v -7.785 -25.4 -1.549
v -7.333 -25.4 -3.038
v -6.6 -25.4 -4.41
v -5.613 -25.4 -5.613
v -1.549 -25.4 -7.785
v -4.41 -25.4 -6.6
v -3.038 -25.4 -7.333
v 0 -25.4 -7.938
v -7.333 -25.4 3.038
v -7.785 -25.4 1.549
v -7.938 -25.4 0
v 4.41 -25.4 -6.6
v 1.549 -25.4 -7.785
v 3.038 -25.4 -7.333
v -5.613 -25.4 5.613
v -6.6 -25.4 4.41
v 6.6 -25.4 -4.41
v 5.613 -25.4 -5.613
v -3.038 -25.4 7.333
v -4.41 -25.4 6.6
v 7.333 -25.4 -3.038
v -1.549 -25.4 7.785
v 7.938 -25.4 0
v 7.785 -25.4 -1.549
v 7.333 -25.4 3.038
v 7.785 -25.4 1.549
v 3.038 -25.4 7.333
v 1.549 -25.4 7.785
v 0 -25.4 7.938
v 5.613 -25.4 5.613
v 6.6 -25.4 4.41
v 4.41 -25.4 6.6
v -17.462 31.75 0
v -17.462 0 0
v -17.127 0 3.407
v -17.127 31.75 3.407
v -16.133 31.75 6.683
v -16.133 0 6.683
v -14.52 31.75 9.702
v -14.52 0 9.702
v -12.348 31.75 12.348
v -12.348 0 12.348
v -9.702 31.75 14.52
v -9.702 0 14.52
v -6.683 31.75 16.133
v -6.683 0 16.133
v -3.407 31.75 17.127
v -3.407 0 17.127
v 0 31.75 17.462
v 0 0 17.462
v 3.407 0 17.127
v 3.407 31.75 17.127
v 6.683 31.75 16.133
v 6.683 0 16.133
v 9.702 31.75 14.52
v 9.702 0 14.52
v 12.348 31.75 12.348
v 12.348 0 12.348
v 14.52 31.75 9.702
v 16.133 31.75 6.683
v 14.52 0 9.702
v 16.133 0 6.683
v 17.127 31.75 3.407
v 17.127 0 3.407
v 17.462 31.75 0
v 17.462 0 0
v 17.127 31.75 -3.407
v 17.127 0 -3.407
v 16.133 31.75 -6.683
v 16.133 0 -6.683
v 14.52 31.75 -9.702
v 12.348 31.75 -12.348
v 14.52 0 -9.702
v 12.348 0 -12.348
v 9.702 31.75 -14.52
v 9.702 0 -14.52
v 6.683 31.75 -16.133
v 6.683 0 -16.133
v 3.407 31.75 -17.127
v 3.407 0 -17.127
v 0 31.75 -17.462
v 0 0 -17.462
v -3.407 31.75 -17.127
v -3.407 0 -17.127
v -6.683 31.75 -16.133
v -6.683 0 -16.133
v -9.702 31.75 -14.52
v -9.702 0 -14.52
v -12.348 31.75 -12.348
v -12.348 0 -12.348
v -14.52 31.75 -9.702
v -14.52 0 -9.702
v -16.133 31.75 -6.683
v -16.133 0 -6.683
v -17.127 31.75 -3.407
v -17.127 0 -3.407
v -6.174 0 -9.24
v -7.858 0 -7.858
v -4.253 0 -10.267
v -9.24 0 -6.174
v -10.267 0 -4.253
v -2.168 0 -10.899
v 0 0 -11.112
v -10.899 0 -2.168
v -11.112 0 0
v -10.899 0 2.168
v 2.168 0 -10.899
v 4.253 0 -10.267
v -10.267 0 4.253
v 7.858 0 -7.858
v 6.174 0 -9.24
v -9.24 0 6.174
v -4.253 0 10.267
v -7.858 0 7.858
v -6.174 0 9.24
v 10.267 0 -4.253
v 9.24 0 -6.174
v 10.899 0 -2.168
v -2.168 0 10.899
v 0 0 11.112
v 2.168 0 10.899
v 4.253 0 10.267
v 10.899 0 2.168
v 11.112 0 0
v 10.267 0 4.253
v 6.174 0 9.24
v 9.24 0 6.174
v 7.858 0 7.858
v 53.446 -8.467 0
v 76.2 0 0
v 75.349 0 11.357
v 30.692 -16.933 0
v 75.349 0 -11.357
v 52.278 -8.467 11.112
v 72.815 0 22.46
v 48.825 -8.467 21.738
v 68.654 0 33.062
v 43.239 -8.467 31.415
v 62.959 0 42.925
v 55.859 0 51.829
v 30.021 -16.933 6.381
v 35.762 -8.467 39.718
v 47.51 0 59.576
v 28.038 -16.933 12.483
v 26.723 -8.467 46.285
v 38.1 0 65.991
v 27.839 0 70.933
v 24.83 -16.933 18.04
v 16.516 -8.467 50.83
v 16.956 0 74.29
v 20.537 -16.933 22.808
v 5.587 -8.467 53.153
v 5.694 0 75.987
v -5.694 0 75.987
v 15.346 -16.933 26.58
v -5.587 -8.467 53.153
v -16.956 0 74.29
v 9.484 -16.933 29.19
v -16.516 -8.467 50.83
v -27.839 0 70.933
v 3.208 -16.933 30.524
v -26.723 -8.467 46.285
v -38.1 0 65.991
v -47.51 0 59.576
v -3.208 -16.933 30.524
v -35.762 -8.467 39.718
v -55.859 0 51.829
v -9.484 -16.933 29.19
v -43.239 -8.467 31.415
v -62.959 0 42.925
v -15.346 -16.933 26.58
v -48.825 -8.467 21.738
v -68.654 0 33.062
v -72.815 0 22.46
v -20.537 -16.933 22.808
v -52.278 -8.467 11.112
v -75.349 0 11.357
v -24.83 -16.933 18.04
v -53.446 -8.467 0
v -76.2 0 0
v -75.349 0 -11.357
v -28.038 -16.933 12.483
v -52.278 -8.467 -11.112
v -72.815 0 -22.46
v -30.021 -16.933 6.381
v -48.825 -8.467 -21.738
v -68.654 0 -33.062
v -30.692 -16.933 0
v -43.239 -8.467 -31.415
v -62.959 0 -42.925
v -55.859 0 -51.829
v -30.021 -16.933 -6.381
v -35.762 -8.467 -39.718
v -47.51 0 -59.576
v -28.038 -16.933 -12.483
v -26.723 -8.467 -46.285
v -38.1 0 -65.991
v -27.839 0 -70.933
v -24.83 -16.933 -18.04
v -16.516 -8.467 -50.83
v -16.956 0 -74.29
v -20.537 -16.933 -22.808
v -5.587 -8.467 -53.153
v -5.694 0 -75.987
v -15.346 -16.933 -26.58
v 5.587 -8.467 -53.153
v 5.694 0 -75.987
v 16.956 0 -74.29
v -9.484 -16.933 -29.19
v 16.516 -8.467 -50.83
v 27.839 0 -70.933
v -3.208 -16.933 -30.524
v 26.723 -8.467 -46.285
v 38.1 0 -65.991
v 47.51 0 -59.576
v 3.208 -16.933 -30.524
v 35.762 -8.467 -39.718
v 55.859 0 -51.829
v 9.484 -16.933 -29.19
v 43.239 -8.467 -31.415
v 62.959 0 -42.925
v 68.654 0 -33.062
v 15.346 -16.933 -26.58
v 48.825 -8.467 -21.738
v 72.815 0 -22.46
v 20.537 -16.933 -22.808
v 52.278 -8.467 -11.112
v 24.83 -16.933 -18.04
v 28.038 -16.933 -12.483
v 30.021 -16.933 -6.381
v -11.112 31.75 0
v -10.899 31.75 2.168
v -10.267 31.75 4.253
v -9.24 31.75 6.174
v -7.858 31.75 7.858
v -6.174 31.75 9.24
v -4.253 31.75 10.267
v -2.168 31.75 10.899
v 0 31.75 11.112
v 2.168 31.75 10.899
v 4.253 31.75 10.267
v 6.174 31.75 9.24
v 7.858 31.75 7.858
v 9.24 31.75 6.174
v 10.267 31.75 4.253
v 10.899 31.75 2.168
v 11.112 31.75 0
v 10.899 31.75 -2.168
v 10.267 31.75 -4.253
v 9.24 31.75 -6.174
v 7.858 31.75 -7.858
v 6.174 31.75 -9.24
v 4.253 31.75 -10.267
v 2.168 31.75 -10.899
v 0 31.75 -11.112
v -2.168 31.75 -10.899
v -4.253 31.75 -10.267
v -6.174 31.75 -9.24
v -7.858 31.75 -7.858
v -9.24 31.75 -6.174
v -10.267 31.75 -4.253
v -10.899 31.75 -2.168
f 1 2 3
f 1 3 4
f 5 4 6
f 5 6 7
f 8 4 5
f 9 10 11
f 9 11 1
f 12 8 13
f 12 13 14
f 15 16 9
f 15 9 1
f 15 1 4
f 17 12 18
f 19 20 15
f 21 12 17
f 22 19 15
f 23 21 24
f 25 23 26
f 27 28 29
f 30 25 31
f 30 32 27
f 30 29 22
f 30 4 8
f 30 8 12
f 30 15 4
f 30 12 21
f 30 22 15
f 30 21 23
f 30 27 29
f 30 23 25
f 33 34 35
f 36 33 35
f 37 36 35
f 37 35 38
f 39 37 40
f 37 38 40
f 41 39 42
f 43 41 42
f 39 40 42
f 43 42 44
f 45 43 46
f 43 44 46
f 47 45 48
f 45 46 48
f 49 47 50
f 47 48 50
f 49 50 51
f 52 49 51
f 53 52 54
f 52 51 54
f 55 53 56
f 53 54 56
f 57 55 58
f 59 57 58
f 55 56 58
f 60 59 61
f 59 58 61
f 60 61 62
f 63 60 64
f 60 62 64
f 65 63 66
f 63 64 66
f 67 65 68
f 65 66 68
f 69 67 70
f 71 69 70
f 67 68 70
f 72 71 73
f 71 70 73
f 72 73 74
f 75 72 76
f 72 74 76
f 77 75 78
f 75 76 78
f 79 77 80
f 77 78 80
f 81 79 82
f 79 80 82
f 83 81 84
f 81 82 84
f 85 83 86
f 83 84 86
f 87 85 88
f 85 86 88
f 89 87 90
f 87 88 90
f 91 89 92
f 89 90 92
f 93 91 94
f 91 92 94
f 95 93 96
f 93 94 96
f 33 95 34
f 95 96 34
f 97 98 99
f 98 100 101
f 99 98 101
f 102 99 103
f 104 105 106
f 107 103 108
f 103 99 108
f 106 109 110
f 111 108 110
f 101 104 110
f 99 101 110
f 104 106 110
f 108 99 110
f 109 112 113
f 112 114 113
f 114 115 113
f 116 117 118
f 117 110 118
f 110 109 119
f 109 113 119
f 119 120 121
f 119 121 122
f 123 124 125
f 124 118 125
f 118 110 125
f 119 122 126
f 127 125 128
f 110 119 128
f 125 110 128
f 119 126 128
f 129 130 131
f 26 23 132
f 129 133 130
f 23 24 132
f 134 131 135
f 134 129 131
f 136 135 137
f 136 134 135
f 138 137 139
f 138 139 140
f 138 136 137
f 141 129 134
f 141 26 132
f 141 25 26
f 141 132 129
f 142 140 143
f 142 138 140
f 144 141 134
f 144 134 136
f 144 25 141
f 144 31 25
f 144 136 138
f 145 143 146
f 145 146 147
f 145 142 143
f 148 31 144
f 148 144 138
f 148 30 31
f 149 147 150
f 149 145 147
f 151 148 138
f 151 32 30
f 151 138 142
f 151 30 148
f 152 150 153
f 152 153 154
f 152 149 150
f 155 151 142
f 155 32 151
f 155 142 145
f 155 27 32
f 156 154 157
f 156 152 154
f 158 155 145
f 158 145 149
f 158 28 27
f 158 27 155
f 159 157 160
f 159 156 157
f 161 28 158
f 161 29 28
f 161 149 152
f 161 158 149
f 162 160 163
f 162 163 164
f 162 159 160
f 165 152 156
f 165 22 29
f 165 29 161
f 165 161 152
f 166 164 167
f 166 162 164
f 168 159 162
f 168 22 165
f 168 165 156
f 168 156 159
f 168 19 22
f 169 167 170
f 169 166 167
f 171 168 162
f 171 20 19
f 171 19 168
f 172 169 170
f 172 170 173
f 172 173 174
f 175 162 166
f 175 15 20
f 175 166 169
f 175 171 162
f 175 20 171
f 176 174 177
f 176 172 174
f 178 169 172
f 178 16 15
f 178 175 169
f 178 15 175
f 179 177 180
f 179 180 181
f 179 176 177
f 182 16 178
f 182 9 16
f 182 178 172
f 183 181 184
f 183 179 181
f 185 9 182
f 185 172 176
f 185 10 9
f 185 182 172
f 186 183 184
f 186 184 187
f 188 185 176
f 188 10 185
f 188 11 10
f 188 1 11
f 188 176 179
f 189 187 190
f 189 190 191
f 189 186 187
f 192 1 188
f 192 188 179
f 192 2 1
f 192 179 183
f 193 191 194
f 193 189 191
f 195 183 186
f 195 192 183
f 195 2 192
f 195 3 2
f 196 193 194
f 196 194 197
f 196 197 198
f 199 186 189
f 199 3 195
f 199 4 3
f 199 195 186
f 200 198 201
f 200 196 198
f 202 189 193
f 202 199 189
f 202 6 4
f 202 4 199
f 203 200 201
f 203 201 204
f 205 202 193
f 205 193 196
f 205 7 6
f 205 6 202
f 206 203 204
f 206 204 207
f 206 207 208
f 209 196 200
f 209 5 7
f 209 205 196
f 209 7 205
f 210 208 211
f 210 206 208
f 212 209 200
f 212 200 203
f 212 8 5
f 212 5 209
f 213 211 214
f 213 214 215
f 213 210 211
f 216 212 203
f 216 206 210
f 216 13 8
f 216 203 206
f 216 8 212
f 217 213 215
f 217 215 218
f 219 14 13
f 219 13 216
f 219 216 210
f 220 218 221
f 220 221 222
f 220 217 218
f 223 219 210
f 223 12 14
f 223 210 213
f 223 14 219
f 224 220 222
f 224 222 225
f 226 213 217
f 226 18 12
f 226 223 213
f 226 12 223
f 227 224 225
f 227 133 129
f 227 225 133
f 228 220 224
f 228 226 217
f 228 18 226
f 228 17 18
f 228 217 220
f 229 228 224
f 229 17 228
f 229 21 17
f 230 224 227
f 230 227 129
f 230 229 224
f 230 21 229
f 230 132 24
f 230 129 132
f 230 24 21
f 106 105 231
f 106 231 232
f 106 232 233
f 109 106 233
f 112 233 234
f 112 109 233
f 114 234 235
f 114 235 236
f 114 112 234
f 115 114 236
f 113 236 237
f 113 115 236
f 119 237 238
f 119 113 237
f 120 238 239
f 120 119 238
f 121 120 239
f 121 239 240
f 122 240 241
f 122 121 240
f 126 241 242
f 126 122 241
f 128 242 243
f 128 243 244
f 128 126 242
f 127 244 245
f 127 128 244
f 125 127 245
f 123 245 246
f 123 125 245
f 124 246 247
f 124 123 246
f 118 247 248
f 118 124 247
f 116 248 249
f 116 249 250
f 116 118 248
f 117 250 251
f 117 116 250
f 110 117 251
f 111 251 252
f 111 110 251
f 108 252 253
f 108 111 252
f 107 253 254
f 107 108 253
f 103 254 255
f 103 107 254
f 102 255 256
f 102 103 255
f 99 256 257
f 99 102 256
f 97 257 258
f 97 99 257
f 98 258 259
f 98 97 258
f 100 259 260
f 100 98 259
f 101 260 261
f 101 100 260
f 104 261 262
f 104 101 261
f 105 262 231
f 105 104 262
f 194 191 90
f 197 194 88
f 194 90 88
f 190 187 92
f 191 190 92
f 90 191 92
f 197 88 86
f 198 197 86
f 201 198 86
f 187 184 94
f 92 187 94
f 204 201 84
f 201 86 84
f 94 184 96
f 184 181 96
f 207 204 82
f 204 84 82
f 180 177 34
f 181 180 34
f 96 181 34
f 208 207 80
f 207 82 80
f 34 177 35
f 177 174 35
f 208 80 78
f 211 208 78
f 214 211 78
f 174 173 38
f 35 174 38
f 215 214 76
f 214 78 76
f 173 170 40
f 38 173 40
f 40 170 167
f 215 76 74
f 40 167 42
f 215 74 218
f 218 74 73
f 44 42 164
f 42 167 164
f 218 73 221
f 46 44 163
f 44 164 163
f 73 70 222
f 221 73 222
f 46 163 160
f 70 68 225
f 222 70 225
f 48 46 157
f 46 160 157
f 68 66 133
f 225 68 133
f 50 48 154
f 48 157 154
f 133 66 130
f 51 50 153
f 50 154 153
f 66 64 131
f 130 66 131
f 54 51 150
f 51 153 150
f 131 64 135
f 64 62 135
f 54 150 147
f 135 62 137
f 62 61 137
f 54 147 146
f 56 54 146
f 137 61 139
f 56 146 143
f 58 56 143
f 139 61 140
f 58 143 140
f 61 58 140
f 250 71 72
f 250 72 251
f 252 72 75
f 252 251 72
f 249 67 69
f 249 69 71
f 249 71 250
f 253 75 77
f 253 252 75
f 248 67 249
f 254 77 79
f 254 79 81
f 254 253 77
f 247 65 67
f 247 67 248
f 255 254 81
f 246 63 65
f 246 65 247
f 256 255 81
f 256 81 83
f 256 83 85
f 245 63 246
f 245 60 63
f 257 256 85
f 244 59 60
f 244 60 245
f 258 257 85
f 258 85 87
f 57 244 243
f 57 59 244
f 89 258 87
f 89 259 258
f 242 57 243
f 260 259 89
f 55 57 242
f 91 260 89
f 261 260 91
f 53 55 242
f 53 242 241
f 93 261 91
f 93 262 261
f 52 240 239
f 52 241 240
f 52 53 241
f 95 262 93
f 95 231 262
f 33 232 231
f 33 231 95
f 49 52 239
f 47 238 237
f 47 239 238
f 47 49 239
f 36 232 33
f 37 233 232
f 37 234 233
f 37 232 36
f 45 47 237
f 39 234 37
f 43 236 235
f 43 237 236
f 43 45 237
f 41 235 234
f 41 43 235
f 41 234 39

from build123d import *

# Parameters (mm, degrees)
F0_R     = 76.2
F2_R     = 7.9375
F4_R     = 17.4625
F4_R_2   = 11.1125
F5_DEPTH = 31.75


with BuildPart() as f3:
    # F0 (on Front) → F3 section 0
    with BuildSketch(Plane.XZ):
        Circle(F0_R)
    # F2 (on offset) → F3 section 1
    with BuildSketch(Plane.XZ.offset(25.4)):
        Circle(F2_R)
    loft()

    # F4 (on face) → F5 (join)
    with BuildSketch(Plane(origin=(0, 0, 0), x_dir=(-1, 0, 0), z_dir=(0, 1, 0))):
        Circle(F4_R)
        Circle(F4_R_2, mode=Mode.SUBTRACT)
    extrude(amount=F5_DEPTH)


solid = f3.part
